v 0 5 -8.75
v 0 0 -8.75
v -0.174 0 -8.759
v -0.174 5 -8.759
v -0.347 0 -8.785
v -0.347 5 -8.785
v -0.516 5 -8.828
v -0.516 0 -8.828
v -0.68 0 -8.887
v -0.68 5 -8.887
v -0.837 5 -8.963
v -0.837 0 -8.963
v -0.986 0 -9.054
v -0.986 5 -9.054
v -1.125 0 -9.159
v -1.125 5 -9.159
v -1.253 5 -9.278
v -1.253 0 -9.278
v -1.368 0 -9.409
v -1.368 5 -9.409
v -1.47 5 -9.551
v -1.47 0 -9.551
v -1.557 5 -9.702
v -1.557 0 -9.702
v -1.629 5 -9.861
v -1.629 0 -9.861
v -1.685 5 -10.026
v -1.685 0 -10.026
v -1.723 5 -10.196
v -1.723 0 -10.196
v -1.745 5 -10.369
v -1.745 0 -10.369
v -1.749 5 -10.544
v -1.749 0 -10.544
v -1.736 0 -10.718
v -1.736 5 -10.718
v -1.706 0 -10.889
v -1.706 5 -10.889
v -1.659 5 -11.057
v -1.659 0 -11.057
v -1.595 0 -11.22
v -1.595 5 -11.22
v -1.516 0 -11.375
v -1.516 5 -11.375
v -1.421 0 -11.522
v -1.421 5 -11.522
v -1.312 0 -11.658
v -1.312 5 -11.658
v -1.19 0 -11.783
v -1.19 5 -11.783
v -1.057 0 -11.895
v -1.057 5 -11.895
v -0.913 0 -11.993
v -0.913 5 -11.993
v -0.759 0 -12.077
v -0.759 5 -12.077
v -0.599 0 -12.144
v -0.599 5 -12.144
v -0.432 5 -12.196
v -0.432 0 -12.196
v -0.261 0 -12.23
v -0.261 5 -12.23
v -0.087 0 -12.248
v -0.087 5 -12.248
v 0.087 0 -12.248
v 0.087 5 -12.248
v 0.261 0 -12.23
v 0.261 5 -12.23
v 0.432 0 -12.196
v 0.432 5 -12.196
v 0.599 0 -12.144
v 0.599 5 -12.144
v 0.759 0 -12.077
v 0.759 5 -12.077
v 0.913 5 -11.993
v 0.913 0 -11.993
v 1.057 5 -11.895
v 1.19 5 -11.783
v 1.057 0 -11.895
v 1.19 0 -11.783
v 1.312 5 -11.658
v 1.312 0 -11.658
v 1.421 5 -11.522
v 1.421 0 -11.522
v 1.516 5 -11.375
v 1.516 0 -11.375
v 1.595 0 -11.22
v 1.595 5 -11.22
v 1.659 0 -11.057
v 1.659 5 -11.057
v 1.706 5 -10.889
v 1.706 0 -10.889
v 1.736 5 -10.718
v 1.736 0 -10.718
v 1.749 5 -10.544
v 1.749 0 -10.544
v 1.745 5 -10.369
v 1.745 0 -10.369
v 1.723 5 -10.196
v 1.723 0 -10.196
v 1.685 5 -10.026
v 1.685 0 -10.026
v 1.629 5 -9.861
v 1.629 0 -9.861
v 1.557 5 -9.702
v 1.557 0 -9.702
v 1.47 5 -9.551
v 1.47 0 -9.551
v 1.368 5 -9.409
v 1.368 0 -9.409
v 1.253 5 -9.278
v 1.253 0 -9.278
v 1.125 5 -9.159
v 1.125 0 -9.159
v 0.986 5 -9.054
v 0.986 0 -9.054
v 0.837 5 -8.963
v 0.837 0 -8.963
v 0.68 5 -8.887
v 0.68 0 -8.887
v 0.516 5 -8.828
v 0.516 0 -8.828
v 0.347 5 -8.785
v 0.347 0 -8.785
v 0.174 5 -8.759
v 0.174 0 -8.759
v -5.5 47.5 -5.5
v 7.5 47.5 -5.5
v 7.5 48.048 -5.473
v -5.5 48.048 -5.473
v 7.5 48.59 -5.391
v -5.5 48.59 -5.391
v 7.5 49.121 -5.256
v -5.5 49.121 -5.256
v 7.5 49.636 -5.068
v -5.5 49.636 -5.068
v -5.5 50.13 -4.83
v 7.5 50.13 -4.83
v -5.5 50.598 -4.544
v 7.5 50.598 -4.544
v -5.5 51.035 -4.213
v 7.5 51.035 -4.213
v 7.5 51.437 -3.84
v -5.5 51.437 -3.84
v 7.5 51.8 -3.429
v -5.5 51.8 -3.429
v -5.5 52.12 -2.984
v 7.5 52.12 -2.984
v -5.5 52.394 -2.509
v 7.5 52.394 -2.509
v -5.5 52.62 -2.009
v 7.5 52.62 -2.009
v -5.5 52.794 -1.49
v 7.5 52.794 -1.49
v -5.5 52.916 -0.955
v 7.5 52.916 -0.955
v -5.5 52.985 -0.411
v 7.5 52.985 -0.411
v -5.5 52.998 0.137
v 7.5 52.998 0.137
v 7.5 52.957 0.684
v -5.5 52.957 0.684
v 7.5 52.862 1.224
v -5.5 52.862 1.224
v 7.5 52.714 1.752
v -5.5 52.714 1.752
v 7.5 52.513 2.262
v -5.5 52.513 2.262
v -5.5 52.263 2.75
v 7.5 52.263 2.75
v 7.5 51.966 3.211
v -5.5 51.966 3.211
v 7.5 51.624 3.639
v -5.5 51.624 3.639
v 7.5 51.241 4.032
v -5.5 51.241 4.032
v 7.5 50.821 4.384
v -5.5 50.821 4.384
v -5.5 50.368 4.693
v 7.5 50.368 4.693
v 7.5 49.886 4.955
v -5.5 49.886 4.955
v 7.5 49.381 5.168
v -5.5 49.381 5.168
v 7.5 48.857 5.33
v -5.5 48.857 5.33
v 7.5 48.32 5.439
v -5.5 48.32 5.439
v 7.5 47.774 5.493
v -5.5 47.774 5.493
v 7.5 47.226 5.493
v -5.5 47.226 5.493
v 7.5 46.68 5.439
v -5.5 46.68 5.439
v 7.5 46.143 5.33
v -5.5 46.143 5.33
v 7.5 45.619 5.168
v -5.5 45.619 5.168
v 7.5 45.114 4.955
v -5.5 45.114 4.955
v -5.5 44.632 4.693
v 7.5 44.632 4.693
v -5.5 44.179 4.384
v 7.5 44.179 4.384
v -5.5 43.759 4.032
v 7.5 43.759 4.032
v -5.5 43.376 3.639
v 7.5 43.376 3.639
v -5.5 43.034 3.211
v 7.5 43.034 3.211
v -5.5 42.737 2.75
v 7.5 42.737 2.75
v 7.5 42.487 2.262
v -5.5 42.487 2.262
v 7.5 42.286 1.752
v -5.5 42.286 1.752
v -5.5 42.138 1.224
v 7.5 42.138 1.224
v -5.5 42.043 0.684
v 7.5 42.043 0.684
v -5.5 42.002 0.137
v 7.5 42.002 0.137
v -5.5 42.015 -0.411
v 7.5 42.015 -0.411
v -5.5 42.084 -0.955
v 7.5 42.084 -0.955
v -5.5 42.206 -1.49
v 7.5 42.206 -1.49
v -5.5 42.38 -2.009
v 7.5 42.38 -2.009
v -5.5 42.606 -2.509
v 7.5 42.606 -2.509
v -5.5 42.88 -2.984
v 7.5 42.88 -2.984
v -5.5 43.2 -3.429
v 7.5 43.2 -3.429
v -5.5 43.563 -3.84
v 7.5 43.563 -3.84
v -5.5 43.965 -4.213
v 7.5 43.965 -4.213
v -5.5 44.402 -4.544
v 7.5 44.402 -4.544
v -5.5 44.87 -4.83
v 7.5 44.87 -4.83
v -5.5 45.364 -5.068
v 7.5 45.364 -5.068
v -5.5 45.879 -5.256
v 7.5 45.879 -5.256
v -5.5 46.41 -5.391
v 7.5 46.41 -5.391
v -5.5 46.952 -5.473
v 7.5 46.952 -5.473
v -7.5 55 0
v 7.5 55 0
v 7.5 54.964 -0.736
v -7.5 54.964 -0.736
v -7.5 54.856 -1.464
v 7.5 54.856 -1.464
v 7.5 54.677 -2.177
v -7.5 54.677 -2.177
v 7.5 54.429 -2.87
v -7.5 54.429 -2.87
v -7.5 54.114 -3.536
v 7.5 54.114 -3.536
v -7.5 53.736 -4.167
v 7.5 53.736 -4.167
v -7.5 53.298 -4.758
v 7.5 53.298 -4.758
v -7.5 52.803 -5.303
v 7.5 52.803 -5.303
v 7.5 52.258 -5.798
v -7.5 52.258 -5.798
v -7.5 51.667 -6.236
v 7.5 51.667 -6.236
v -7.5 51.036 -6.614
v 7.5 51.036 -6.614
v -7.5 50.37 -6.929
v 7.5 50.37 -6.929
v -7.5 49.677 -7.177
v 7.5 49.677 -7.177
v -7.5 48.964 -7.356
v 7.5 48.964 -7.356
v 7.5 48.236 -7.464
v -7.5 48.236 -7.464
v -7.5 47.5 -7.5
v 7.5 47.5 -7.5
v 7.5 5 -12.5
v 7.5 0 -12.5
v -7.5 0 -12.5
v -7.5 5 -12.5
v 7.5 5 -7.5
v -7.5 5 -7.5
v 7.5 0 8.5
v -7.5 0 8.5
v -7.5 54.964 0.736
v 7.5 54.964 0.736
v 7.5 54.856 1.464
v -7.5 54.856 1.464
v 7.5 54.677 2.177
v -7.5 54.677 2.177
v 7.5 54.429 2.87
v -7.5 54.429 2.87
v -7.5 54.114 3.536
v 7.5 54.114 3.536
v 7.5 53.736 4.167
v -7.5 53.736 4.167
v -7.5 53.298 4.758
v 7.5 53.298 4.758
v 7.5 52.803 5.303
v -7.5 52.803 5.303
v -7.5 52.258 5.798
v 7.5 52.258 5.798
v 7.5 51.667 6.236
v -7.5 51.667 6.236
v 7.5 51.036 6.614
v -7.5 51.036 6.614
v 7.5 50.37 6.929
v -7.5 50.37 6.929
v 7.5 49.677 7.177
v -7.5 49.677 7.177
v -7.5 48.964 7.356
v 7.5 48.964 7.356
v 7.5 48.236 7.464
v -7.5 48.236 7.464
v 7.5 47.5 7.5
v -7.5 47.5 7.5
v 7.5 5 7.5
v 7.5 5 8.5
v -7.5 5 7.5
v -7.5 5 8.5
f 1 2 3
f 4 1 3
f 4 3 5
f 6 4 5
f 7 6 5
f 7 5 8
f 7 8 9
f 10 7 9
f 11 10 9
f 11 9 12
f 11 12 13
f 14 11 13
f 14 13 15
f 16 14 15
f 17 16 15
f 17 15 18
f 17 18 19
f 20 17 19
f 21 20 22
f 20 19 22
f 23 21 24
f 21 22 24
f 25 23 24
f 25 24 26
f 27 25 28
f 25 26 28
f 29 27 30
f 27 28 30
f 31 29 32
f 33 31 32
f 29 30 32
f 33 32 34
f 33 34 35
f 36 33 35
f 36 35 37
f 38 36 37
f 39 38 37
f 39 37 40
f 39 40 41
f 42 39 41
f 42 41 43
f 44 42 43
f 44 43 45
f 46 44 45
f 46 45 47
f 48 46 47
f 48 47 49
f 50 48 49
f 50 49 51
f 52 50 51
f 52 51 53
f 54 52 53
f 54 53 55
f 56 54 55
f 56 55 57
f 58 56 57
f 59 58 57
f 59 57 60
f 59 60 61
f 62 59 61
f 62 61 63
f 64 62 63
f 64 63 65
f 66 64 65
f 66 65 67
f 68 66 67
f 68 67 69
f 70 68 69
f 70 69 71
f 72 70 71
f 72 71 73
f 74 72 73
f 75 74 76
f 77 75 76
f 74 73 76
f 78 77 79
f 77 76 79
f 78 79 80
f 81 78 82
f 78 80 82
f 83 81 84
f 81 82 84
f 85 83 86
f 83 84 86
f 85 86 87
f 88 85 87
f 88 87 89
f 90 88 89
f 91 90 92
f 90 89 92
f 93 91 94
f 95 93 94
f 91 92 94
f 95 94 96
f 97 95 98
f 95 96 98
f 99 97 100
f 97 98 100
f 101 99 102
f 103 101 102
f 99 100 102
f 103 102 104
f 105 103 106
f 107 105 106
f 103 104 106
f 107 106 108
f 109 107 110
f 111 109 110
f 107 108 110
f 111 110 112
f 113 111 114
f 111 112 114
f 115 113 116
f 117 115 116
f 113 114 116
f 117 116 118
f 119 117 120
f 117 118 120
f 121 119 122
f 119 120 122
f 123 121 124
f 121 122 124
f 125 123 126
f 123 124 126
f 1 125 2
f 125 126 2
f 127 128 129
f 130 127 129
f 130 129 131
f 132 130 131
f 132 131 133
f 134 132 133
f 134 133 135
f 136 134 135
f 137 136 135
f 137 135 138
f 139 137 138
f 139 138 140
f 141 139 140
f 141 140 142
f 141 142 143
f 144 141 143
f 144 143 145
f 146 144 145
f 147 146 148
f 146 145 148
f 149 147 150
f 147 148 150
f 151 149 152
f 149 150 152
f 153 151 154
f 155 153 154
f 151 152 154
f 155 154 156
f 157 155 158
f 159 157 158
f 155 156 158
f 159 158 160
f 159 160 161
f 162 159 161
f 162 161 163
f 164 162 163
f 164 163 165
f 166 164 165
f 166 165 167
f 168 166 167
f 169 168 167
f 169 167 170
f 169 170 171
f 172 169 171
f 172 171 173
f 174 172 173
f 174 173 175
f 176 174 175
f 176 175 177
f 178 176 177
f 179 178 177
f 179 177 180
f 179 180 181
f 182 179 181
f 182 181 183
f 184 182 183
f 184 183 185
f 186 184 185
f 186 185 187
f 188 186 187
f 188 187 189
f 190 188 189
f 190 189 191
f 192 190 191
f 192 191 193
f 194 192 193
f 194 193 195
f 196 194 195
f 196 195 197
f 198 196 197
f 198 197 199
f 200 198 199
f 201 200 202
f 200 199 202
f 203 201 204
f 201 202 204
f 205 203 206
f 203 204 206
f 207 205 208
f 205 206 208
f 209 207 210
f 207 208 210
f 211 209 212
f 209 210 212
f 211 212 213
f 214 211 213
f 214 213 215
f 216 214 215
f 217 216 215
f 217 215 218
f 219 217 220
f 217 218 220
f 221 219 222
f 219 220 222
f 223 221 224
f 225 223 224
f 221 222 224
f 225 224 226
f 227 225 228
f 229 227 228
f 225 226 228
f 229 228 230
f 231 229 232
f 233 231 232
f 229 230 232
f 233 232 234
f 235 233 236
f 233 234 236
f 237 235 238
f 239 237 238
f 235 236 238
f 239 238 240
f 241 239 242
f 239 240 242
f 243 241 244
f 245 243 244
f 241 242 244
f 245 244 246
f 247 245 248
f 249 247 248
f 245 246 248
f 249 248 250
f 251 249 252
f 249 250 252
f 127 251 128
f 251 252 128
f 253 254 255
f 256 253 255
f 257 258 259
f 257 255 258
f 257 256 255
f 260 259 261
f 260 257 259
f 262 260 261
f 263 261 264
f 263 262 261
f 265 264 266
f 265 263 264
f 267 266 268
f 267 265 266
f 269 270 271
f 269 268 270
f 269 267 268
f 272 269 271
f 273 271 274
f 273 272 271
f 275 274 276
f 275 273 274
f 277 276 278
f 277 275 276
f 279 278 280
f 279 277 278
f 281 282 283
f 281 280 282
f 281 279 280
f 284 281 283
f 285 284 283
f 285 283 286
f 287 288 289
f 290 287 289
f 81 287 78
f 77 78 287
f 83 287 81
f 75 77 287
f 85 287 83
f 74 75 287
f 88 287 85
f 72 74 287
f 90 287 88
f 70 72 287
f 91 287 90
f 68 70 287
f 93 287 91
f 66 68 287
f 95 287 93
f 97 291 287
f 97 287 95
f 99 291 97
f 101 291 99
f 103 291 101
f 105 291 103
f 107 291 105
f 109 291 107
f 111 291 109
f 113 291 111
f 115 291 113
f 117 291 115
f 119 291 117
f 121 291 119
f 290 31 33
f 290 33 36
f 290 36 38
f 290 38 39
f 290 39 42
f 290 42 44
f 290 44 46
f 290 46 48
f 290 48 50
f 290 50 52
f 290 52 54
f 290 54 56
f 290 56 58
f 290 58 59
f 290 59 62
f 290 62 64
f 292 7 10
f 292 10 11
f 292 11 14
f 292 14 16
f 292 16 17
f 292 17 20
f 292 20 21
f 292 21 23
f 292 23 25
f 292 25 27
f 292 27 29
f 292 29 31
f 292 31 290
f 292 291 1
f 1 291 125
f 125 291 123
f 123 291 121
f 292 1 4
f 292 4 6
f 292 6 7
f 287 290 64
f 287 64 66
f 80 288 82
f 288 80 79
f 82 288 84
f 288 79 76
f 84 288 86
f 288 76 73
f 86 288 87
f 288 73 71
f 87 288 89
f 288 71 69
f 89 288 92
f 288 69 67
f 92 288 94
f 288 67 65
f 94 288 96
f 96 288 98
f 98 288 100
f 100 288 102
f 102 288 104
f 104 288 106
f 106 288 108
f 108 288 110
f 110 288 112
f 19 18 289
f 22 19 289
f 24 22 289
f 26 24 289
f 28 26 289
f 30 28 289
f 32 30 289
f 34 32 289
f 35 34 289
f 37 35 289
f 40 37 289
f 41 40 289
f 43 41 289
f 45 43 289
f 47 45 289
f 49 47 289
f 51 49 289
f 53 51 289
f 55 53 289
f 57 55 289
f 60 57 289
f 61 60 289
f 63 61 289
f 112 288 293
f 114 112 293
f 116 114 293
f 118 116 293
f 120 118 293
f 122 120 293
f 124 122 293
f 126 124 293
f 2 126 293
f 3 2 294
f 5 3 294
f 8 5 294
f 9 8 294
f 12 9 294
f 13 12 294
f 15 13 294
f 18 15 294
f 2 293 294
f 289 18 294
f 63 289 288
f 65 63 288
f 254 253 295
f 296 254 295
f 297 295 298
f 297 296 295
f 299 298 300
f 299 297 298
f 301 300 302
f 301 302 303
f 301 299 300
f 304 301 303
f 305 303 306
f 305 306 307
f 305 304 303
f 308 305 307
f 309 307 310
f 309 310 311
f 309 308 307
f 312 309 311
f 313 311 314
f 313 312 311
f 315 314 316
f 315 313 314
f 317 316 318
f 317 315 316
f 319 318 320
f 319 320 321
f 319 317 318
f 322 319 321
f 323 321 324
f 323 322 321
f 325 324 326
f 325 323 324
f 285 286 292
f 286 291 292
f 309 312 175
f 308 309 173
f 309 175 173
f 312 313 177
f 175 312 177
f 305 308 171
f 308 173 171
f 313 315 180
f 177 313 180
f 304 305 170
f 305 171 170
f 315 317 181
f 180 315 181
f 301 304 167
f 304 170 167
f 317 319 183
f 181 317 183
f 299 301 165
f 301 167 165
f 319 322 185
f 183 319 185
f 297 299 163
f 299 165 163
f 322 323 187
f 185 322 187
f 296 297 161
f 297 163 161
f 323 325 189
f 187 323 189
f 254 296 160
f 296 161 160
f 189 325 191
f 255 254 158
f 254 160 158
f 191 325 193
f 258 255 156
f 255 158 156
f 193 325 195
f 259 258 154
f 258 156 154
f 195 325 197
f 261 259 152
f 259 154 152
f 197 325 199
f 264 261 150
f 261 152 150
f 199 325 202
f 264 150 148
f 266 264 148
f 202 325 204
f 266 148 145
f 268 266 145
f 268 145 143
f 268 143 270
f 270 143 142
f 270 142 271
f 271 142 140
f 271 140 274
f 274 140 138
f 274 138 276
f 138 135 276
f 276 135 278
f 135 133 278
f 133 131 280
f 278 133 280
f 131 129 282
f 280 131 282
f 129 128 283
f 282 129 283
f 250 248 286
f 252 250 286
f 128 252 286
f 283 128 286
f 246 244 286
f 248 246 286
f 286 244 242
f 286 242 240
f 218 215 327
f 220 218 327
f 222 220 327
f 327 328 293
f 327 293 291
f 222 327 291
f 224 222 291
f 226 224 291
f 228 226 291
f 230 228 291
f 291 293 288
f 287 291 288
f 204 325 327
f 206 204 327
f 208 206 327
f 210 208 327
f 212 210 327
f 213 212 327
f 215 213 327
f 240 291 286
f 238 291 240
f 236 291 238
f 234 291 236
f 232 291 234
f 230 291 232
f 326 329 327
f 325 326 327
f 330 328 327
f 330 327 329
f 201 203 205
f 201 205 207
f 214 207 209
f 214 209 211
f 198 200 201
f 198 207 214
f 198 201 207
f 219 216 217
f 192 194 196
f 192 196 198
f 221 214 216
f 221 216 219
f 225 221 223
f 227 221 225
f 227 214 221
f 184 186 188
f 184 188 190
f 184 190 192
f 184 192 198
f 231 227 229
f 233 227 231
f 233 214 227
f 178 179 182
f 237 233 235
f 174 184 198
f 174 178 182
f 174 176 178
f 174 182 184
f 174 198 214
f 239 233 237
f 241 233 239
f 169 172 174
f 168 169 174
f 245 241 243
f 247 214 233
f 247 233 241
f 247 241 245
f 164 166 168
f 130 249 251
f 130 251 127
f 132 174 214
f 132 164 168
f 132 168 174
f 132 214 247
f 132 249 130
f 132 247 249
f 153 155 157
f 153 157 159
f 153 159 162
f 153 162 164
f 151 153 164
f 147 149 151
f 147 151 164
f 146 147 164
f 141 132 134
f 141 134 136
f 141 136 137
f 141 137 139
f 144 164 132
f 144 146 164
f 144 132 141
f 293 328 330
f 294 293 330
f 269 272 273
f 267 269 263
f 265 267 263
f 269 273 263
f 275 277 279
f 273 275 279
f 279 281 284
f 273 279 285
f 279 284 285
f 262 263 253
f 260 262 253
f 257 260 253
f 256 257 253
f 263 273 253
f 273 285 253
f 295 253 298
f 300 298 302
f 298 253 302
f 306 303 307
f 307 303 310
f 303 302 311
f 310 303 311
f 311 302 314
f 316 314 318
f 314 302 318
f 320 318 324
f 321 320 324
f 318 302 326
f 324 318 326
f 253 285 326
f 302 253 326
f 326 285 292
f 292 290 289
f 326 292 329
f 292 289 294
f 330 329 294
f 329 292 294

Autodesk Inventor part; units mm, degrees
ref_plane "YZ Plane" through (0, 0, 0) normal (1, 0, 0) x (0, 1, 0)
ref_plane "XZ Plane" through (0, 0, 0) normal (0, 1, 0) x (-1, 0, 0)
ref_plane "XY Plane" through (0, 0, 0) normal (0, 0, 1) x (1, 0, 0)
sketch "Sketch1" plane through (0, 0, 0) normal (0, 1, 0) x (-1, 0, 0)
  line L0 (7.5, 12.5) -> (-7.5, 12.5)
  line L1 (-7.5, 12.5) -> (-7.5, -12.5)
  line L2 (-7.5, -12.5) -> (7.5, -12.5)
  line L3 (7.5, -12.5) -> (7.5, 12.5)
  line L4 (7.5, 12.5) -> (-7.5, -12.5) construction
  line L5 (-7.5, 12.5) -> (7.5, -12.5) construction
  point P0 (0, 0)
  dimension "d0" = 15
  dimension "d1" = 25
extrude "Extrusion1" add sketch "Sketch1" along normal blind 5
sketch "Sketch2" plane through (0, 5, 0) normal (0, 1, 0) x (1, 0, 0)
  line L0 (-7.5, -12.5) -> (7.5, -12.5) projected
  line L1 (-7.5, 12.5) -> (-7.5, -12.5) projected
  line L2 (7.5, 7.5) -> (-7.5, 7.5)
  line L3 (-7.5, 7.5) -> (-7.5, -7.5)
  line L4 (-7.5, -7.5) -> (7.5, -7.5)
  line L5 (7.5, -7.5) -> (7.5, 7.5)
  line L6 (7.5, 7.5) -> (-7.5, -7.5) construction
  line L7 (-7.5, 7.5) -> (7.5, -7.5) construction
  point P0 (0, 0)
  dimension "d5" = 15
extrude "Extrusion2" add sketch "Sketch2" along normal blind 50
sketch "Sketch3" plane through (7.5, 0, 12.5) normal (1, 0, 0) x (0, 0, -1)
  circle A0 centre (12.5, 47.5) radius 5.5
  point P0 (12.5, 0)
  point P1 (14.5, 47.5)
  dimension "d9" = 11
extrude "Extrusion3" cut sketch "Sketch3" against normal blind 13
fillet "Fillet1" radius 7.5 2 edges at (0, 55, -7.5) (0, 55, 7.5)
sketch "Sketch5" plane through (0, 5, 0) normal (0, 1, 0) x (1, 0, 0)
  line L0 (7.5, -7.5) -> (-7.5, -7.5) projected
  line L1 (-7.5, -12.5) -> (7.5, -12.5) projected
  line L2 (-7.5, 7.5) -> (7.5, 7.5) projected
  line L3 (7.5, 12.5) -> (-7.5, 12.5) projected
  point P0 (0, 0)
  point P1 (0, -10.5)
  point P2 (0, 10.5)
hole "Hole2" at (0, 5, 10.5) at (0, 5, -10.5) direction (0, -1, 0) diameter 3.5 end through all
sketch "Sketch6" plane through (0, 5, 0) normal (0, 1, 0) x (1, 0, 0)
  point P0 (0, 0)
sketch "Sketch7" plane through (0, 5, 0) normal (0, 1, 0) x (1, 0, 0)
  line L0 (7.5, -7.5) -> (-7.5, -7.5) projected
  line L1 (-7.5, -12.5) -> (7.5, -12.5) projected
  line L2 (-7.5, -7.5) -> (7.5, -7.5)
  line L3 (7.5, -7.5) -> (7.5, -12.5)
  line L4 (7.5, -12.5) -> (-7.5, -12.5)
  line L5 (-7.5, -12.5) -> (-7.5, -7.5)
  line L6 (-7.5, -12.5) -> (7.5, -12.5)
  line L7 (7.5, -12.5) -> (7.5, -8.5)
  line L8 (7.5, -8.5) -> (-7.5, -8.5)
  line L9 (-7.5, -8.5) -> (-7.5, -12.5)
  point P0 (0, 0)
  point P1 (-7.5, -8.5)
  dimension "d33" = 4
extrude "Extrusion5" cut sketch "Sketch7" against normal through all contours L3 L1 L5 L8
properties part number "Holder_slim_1_fod_højre"
